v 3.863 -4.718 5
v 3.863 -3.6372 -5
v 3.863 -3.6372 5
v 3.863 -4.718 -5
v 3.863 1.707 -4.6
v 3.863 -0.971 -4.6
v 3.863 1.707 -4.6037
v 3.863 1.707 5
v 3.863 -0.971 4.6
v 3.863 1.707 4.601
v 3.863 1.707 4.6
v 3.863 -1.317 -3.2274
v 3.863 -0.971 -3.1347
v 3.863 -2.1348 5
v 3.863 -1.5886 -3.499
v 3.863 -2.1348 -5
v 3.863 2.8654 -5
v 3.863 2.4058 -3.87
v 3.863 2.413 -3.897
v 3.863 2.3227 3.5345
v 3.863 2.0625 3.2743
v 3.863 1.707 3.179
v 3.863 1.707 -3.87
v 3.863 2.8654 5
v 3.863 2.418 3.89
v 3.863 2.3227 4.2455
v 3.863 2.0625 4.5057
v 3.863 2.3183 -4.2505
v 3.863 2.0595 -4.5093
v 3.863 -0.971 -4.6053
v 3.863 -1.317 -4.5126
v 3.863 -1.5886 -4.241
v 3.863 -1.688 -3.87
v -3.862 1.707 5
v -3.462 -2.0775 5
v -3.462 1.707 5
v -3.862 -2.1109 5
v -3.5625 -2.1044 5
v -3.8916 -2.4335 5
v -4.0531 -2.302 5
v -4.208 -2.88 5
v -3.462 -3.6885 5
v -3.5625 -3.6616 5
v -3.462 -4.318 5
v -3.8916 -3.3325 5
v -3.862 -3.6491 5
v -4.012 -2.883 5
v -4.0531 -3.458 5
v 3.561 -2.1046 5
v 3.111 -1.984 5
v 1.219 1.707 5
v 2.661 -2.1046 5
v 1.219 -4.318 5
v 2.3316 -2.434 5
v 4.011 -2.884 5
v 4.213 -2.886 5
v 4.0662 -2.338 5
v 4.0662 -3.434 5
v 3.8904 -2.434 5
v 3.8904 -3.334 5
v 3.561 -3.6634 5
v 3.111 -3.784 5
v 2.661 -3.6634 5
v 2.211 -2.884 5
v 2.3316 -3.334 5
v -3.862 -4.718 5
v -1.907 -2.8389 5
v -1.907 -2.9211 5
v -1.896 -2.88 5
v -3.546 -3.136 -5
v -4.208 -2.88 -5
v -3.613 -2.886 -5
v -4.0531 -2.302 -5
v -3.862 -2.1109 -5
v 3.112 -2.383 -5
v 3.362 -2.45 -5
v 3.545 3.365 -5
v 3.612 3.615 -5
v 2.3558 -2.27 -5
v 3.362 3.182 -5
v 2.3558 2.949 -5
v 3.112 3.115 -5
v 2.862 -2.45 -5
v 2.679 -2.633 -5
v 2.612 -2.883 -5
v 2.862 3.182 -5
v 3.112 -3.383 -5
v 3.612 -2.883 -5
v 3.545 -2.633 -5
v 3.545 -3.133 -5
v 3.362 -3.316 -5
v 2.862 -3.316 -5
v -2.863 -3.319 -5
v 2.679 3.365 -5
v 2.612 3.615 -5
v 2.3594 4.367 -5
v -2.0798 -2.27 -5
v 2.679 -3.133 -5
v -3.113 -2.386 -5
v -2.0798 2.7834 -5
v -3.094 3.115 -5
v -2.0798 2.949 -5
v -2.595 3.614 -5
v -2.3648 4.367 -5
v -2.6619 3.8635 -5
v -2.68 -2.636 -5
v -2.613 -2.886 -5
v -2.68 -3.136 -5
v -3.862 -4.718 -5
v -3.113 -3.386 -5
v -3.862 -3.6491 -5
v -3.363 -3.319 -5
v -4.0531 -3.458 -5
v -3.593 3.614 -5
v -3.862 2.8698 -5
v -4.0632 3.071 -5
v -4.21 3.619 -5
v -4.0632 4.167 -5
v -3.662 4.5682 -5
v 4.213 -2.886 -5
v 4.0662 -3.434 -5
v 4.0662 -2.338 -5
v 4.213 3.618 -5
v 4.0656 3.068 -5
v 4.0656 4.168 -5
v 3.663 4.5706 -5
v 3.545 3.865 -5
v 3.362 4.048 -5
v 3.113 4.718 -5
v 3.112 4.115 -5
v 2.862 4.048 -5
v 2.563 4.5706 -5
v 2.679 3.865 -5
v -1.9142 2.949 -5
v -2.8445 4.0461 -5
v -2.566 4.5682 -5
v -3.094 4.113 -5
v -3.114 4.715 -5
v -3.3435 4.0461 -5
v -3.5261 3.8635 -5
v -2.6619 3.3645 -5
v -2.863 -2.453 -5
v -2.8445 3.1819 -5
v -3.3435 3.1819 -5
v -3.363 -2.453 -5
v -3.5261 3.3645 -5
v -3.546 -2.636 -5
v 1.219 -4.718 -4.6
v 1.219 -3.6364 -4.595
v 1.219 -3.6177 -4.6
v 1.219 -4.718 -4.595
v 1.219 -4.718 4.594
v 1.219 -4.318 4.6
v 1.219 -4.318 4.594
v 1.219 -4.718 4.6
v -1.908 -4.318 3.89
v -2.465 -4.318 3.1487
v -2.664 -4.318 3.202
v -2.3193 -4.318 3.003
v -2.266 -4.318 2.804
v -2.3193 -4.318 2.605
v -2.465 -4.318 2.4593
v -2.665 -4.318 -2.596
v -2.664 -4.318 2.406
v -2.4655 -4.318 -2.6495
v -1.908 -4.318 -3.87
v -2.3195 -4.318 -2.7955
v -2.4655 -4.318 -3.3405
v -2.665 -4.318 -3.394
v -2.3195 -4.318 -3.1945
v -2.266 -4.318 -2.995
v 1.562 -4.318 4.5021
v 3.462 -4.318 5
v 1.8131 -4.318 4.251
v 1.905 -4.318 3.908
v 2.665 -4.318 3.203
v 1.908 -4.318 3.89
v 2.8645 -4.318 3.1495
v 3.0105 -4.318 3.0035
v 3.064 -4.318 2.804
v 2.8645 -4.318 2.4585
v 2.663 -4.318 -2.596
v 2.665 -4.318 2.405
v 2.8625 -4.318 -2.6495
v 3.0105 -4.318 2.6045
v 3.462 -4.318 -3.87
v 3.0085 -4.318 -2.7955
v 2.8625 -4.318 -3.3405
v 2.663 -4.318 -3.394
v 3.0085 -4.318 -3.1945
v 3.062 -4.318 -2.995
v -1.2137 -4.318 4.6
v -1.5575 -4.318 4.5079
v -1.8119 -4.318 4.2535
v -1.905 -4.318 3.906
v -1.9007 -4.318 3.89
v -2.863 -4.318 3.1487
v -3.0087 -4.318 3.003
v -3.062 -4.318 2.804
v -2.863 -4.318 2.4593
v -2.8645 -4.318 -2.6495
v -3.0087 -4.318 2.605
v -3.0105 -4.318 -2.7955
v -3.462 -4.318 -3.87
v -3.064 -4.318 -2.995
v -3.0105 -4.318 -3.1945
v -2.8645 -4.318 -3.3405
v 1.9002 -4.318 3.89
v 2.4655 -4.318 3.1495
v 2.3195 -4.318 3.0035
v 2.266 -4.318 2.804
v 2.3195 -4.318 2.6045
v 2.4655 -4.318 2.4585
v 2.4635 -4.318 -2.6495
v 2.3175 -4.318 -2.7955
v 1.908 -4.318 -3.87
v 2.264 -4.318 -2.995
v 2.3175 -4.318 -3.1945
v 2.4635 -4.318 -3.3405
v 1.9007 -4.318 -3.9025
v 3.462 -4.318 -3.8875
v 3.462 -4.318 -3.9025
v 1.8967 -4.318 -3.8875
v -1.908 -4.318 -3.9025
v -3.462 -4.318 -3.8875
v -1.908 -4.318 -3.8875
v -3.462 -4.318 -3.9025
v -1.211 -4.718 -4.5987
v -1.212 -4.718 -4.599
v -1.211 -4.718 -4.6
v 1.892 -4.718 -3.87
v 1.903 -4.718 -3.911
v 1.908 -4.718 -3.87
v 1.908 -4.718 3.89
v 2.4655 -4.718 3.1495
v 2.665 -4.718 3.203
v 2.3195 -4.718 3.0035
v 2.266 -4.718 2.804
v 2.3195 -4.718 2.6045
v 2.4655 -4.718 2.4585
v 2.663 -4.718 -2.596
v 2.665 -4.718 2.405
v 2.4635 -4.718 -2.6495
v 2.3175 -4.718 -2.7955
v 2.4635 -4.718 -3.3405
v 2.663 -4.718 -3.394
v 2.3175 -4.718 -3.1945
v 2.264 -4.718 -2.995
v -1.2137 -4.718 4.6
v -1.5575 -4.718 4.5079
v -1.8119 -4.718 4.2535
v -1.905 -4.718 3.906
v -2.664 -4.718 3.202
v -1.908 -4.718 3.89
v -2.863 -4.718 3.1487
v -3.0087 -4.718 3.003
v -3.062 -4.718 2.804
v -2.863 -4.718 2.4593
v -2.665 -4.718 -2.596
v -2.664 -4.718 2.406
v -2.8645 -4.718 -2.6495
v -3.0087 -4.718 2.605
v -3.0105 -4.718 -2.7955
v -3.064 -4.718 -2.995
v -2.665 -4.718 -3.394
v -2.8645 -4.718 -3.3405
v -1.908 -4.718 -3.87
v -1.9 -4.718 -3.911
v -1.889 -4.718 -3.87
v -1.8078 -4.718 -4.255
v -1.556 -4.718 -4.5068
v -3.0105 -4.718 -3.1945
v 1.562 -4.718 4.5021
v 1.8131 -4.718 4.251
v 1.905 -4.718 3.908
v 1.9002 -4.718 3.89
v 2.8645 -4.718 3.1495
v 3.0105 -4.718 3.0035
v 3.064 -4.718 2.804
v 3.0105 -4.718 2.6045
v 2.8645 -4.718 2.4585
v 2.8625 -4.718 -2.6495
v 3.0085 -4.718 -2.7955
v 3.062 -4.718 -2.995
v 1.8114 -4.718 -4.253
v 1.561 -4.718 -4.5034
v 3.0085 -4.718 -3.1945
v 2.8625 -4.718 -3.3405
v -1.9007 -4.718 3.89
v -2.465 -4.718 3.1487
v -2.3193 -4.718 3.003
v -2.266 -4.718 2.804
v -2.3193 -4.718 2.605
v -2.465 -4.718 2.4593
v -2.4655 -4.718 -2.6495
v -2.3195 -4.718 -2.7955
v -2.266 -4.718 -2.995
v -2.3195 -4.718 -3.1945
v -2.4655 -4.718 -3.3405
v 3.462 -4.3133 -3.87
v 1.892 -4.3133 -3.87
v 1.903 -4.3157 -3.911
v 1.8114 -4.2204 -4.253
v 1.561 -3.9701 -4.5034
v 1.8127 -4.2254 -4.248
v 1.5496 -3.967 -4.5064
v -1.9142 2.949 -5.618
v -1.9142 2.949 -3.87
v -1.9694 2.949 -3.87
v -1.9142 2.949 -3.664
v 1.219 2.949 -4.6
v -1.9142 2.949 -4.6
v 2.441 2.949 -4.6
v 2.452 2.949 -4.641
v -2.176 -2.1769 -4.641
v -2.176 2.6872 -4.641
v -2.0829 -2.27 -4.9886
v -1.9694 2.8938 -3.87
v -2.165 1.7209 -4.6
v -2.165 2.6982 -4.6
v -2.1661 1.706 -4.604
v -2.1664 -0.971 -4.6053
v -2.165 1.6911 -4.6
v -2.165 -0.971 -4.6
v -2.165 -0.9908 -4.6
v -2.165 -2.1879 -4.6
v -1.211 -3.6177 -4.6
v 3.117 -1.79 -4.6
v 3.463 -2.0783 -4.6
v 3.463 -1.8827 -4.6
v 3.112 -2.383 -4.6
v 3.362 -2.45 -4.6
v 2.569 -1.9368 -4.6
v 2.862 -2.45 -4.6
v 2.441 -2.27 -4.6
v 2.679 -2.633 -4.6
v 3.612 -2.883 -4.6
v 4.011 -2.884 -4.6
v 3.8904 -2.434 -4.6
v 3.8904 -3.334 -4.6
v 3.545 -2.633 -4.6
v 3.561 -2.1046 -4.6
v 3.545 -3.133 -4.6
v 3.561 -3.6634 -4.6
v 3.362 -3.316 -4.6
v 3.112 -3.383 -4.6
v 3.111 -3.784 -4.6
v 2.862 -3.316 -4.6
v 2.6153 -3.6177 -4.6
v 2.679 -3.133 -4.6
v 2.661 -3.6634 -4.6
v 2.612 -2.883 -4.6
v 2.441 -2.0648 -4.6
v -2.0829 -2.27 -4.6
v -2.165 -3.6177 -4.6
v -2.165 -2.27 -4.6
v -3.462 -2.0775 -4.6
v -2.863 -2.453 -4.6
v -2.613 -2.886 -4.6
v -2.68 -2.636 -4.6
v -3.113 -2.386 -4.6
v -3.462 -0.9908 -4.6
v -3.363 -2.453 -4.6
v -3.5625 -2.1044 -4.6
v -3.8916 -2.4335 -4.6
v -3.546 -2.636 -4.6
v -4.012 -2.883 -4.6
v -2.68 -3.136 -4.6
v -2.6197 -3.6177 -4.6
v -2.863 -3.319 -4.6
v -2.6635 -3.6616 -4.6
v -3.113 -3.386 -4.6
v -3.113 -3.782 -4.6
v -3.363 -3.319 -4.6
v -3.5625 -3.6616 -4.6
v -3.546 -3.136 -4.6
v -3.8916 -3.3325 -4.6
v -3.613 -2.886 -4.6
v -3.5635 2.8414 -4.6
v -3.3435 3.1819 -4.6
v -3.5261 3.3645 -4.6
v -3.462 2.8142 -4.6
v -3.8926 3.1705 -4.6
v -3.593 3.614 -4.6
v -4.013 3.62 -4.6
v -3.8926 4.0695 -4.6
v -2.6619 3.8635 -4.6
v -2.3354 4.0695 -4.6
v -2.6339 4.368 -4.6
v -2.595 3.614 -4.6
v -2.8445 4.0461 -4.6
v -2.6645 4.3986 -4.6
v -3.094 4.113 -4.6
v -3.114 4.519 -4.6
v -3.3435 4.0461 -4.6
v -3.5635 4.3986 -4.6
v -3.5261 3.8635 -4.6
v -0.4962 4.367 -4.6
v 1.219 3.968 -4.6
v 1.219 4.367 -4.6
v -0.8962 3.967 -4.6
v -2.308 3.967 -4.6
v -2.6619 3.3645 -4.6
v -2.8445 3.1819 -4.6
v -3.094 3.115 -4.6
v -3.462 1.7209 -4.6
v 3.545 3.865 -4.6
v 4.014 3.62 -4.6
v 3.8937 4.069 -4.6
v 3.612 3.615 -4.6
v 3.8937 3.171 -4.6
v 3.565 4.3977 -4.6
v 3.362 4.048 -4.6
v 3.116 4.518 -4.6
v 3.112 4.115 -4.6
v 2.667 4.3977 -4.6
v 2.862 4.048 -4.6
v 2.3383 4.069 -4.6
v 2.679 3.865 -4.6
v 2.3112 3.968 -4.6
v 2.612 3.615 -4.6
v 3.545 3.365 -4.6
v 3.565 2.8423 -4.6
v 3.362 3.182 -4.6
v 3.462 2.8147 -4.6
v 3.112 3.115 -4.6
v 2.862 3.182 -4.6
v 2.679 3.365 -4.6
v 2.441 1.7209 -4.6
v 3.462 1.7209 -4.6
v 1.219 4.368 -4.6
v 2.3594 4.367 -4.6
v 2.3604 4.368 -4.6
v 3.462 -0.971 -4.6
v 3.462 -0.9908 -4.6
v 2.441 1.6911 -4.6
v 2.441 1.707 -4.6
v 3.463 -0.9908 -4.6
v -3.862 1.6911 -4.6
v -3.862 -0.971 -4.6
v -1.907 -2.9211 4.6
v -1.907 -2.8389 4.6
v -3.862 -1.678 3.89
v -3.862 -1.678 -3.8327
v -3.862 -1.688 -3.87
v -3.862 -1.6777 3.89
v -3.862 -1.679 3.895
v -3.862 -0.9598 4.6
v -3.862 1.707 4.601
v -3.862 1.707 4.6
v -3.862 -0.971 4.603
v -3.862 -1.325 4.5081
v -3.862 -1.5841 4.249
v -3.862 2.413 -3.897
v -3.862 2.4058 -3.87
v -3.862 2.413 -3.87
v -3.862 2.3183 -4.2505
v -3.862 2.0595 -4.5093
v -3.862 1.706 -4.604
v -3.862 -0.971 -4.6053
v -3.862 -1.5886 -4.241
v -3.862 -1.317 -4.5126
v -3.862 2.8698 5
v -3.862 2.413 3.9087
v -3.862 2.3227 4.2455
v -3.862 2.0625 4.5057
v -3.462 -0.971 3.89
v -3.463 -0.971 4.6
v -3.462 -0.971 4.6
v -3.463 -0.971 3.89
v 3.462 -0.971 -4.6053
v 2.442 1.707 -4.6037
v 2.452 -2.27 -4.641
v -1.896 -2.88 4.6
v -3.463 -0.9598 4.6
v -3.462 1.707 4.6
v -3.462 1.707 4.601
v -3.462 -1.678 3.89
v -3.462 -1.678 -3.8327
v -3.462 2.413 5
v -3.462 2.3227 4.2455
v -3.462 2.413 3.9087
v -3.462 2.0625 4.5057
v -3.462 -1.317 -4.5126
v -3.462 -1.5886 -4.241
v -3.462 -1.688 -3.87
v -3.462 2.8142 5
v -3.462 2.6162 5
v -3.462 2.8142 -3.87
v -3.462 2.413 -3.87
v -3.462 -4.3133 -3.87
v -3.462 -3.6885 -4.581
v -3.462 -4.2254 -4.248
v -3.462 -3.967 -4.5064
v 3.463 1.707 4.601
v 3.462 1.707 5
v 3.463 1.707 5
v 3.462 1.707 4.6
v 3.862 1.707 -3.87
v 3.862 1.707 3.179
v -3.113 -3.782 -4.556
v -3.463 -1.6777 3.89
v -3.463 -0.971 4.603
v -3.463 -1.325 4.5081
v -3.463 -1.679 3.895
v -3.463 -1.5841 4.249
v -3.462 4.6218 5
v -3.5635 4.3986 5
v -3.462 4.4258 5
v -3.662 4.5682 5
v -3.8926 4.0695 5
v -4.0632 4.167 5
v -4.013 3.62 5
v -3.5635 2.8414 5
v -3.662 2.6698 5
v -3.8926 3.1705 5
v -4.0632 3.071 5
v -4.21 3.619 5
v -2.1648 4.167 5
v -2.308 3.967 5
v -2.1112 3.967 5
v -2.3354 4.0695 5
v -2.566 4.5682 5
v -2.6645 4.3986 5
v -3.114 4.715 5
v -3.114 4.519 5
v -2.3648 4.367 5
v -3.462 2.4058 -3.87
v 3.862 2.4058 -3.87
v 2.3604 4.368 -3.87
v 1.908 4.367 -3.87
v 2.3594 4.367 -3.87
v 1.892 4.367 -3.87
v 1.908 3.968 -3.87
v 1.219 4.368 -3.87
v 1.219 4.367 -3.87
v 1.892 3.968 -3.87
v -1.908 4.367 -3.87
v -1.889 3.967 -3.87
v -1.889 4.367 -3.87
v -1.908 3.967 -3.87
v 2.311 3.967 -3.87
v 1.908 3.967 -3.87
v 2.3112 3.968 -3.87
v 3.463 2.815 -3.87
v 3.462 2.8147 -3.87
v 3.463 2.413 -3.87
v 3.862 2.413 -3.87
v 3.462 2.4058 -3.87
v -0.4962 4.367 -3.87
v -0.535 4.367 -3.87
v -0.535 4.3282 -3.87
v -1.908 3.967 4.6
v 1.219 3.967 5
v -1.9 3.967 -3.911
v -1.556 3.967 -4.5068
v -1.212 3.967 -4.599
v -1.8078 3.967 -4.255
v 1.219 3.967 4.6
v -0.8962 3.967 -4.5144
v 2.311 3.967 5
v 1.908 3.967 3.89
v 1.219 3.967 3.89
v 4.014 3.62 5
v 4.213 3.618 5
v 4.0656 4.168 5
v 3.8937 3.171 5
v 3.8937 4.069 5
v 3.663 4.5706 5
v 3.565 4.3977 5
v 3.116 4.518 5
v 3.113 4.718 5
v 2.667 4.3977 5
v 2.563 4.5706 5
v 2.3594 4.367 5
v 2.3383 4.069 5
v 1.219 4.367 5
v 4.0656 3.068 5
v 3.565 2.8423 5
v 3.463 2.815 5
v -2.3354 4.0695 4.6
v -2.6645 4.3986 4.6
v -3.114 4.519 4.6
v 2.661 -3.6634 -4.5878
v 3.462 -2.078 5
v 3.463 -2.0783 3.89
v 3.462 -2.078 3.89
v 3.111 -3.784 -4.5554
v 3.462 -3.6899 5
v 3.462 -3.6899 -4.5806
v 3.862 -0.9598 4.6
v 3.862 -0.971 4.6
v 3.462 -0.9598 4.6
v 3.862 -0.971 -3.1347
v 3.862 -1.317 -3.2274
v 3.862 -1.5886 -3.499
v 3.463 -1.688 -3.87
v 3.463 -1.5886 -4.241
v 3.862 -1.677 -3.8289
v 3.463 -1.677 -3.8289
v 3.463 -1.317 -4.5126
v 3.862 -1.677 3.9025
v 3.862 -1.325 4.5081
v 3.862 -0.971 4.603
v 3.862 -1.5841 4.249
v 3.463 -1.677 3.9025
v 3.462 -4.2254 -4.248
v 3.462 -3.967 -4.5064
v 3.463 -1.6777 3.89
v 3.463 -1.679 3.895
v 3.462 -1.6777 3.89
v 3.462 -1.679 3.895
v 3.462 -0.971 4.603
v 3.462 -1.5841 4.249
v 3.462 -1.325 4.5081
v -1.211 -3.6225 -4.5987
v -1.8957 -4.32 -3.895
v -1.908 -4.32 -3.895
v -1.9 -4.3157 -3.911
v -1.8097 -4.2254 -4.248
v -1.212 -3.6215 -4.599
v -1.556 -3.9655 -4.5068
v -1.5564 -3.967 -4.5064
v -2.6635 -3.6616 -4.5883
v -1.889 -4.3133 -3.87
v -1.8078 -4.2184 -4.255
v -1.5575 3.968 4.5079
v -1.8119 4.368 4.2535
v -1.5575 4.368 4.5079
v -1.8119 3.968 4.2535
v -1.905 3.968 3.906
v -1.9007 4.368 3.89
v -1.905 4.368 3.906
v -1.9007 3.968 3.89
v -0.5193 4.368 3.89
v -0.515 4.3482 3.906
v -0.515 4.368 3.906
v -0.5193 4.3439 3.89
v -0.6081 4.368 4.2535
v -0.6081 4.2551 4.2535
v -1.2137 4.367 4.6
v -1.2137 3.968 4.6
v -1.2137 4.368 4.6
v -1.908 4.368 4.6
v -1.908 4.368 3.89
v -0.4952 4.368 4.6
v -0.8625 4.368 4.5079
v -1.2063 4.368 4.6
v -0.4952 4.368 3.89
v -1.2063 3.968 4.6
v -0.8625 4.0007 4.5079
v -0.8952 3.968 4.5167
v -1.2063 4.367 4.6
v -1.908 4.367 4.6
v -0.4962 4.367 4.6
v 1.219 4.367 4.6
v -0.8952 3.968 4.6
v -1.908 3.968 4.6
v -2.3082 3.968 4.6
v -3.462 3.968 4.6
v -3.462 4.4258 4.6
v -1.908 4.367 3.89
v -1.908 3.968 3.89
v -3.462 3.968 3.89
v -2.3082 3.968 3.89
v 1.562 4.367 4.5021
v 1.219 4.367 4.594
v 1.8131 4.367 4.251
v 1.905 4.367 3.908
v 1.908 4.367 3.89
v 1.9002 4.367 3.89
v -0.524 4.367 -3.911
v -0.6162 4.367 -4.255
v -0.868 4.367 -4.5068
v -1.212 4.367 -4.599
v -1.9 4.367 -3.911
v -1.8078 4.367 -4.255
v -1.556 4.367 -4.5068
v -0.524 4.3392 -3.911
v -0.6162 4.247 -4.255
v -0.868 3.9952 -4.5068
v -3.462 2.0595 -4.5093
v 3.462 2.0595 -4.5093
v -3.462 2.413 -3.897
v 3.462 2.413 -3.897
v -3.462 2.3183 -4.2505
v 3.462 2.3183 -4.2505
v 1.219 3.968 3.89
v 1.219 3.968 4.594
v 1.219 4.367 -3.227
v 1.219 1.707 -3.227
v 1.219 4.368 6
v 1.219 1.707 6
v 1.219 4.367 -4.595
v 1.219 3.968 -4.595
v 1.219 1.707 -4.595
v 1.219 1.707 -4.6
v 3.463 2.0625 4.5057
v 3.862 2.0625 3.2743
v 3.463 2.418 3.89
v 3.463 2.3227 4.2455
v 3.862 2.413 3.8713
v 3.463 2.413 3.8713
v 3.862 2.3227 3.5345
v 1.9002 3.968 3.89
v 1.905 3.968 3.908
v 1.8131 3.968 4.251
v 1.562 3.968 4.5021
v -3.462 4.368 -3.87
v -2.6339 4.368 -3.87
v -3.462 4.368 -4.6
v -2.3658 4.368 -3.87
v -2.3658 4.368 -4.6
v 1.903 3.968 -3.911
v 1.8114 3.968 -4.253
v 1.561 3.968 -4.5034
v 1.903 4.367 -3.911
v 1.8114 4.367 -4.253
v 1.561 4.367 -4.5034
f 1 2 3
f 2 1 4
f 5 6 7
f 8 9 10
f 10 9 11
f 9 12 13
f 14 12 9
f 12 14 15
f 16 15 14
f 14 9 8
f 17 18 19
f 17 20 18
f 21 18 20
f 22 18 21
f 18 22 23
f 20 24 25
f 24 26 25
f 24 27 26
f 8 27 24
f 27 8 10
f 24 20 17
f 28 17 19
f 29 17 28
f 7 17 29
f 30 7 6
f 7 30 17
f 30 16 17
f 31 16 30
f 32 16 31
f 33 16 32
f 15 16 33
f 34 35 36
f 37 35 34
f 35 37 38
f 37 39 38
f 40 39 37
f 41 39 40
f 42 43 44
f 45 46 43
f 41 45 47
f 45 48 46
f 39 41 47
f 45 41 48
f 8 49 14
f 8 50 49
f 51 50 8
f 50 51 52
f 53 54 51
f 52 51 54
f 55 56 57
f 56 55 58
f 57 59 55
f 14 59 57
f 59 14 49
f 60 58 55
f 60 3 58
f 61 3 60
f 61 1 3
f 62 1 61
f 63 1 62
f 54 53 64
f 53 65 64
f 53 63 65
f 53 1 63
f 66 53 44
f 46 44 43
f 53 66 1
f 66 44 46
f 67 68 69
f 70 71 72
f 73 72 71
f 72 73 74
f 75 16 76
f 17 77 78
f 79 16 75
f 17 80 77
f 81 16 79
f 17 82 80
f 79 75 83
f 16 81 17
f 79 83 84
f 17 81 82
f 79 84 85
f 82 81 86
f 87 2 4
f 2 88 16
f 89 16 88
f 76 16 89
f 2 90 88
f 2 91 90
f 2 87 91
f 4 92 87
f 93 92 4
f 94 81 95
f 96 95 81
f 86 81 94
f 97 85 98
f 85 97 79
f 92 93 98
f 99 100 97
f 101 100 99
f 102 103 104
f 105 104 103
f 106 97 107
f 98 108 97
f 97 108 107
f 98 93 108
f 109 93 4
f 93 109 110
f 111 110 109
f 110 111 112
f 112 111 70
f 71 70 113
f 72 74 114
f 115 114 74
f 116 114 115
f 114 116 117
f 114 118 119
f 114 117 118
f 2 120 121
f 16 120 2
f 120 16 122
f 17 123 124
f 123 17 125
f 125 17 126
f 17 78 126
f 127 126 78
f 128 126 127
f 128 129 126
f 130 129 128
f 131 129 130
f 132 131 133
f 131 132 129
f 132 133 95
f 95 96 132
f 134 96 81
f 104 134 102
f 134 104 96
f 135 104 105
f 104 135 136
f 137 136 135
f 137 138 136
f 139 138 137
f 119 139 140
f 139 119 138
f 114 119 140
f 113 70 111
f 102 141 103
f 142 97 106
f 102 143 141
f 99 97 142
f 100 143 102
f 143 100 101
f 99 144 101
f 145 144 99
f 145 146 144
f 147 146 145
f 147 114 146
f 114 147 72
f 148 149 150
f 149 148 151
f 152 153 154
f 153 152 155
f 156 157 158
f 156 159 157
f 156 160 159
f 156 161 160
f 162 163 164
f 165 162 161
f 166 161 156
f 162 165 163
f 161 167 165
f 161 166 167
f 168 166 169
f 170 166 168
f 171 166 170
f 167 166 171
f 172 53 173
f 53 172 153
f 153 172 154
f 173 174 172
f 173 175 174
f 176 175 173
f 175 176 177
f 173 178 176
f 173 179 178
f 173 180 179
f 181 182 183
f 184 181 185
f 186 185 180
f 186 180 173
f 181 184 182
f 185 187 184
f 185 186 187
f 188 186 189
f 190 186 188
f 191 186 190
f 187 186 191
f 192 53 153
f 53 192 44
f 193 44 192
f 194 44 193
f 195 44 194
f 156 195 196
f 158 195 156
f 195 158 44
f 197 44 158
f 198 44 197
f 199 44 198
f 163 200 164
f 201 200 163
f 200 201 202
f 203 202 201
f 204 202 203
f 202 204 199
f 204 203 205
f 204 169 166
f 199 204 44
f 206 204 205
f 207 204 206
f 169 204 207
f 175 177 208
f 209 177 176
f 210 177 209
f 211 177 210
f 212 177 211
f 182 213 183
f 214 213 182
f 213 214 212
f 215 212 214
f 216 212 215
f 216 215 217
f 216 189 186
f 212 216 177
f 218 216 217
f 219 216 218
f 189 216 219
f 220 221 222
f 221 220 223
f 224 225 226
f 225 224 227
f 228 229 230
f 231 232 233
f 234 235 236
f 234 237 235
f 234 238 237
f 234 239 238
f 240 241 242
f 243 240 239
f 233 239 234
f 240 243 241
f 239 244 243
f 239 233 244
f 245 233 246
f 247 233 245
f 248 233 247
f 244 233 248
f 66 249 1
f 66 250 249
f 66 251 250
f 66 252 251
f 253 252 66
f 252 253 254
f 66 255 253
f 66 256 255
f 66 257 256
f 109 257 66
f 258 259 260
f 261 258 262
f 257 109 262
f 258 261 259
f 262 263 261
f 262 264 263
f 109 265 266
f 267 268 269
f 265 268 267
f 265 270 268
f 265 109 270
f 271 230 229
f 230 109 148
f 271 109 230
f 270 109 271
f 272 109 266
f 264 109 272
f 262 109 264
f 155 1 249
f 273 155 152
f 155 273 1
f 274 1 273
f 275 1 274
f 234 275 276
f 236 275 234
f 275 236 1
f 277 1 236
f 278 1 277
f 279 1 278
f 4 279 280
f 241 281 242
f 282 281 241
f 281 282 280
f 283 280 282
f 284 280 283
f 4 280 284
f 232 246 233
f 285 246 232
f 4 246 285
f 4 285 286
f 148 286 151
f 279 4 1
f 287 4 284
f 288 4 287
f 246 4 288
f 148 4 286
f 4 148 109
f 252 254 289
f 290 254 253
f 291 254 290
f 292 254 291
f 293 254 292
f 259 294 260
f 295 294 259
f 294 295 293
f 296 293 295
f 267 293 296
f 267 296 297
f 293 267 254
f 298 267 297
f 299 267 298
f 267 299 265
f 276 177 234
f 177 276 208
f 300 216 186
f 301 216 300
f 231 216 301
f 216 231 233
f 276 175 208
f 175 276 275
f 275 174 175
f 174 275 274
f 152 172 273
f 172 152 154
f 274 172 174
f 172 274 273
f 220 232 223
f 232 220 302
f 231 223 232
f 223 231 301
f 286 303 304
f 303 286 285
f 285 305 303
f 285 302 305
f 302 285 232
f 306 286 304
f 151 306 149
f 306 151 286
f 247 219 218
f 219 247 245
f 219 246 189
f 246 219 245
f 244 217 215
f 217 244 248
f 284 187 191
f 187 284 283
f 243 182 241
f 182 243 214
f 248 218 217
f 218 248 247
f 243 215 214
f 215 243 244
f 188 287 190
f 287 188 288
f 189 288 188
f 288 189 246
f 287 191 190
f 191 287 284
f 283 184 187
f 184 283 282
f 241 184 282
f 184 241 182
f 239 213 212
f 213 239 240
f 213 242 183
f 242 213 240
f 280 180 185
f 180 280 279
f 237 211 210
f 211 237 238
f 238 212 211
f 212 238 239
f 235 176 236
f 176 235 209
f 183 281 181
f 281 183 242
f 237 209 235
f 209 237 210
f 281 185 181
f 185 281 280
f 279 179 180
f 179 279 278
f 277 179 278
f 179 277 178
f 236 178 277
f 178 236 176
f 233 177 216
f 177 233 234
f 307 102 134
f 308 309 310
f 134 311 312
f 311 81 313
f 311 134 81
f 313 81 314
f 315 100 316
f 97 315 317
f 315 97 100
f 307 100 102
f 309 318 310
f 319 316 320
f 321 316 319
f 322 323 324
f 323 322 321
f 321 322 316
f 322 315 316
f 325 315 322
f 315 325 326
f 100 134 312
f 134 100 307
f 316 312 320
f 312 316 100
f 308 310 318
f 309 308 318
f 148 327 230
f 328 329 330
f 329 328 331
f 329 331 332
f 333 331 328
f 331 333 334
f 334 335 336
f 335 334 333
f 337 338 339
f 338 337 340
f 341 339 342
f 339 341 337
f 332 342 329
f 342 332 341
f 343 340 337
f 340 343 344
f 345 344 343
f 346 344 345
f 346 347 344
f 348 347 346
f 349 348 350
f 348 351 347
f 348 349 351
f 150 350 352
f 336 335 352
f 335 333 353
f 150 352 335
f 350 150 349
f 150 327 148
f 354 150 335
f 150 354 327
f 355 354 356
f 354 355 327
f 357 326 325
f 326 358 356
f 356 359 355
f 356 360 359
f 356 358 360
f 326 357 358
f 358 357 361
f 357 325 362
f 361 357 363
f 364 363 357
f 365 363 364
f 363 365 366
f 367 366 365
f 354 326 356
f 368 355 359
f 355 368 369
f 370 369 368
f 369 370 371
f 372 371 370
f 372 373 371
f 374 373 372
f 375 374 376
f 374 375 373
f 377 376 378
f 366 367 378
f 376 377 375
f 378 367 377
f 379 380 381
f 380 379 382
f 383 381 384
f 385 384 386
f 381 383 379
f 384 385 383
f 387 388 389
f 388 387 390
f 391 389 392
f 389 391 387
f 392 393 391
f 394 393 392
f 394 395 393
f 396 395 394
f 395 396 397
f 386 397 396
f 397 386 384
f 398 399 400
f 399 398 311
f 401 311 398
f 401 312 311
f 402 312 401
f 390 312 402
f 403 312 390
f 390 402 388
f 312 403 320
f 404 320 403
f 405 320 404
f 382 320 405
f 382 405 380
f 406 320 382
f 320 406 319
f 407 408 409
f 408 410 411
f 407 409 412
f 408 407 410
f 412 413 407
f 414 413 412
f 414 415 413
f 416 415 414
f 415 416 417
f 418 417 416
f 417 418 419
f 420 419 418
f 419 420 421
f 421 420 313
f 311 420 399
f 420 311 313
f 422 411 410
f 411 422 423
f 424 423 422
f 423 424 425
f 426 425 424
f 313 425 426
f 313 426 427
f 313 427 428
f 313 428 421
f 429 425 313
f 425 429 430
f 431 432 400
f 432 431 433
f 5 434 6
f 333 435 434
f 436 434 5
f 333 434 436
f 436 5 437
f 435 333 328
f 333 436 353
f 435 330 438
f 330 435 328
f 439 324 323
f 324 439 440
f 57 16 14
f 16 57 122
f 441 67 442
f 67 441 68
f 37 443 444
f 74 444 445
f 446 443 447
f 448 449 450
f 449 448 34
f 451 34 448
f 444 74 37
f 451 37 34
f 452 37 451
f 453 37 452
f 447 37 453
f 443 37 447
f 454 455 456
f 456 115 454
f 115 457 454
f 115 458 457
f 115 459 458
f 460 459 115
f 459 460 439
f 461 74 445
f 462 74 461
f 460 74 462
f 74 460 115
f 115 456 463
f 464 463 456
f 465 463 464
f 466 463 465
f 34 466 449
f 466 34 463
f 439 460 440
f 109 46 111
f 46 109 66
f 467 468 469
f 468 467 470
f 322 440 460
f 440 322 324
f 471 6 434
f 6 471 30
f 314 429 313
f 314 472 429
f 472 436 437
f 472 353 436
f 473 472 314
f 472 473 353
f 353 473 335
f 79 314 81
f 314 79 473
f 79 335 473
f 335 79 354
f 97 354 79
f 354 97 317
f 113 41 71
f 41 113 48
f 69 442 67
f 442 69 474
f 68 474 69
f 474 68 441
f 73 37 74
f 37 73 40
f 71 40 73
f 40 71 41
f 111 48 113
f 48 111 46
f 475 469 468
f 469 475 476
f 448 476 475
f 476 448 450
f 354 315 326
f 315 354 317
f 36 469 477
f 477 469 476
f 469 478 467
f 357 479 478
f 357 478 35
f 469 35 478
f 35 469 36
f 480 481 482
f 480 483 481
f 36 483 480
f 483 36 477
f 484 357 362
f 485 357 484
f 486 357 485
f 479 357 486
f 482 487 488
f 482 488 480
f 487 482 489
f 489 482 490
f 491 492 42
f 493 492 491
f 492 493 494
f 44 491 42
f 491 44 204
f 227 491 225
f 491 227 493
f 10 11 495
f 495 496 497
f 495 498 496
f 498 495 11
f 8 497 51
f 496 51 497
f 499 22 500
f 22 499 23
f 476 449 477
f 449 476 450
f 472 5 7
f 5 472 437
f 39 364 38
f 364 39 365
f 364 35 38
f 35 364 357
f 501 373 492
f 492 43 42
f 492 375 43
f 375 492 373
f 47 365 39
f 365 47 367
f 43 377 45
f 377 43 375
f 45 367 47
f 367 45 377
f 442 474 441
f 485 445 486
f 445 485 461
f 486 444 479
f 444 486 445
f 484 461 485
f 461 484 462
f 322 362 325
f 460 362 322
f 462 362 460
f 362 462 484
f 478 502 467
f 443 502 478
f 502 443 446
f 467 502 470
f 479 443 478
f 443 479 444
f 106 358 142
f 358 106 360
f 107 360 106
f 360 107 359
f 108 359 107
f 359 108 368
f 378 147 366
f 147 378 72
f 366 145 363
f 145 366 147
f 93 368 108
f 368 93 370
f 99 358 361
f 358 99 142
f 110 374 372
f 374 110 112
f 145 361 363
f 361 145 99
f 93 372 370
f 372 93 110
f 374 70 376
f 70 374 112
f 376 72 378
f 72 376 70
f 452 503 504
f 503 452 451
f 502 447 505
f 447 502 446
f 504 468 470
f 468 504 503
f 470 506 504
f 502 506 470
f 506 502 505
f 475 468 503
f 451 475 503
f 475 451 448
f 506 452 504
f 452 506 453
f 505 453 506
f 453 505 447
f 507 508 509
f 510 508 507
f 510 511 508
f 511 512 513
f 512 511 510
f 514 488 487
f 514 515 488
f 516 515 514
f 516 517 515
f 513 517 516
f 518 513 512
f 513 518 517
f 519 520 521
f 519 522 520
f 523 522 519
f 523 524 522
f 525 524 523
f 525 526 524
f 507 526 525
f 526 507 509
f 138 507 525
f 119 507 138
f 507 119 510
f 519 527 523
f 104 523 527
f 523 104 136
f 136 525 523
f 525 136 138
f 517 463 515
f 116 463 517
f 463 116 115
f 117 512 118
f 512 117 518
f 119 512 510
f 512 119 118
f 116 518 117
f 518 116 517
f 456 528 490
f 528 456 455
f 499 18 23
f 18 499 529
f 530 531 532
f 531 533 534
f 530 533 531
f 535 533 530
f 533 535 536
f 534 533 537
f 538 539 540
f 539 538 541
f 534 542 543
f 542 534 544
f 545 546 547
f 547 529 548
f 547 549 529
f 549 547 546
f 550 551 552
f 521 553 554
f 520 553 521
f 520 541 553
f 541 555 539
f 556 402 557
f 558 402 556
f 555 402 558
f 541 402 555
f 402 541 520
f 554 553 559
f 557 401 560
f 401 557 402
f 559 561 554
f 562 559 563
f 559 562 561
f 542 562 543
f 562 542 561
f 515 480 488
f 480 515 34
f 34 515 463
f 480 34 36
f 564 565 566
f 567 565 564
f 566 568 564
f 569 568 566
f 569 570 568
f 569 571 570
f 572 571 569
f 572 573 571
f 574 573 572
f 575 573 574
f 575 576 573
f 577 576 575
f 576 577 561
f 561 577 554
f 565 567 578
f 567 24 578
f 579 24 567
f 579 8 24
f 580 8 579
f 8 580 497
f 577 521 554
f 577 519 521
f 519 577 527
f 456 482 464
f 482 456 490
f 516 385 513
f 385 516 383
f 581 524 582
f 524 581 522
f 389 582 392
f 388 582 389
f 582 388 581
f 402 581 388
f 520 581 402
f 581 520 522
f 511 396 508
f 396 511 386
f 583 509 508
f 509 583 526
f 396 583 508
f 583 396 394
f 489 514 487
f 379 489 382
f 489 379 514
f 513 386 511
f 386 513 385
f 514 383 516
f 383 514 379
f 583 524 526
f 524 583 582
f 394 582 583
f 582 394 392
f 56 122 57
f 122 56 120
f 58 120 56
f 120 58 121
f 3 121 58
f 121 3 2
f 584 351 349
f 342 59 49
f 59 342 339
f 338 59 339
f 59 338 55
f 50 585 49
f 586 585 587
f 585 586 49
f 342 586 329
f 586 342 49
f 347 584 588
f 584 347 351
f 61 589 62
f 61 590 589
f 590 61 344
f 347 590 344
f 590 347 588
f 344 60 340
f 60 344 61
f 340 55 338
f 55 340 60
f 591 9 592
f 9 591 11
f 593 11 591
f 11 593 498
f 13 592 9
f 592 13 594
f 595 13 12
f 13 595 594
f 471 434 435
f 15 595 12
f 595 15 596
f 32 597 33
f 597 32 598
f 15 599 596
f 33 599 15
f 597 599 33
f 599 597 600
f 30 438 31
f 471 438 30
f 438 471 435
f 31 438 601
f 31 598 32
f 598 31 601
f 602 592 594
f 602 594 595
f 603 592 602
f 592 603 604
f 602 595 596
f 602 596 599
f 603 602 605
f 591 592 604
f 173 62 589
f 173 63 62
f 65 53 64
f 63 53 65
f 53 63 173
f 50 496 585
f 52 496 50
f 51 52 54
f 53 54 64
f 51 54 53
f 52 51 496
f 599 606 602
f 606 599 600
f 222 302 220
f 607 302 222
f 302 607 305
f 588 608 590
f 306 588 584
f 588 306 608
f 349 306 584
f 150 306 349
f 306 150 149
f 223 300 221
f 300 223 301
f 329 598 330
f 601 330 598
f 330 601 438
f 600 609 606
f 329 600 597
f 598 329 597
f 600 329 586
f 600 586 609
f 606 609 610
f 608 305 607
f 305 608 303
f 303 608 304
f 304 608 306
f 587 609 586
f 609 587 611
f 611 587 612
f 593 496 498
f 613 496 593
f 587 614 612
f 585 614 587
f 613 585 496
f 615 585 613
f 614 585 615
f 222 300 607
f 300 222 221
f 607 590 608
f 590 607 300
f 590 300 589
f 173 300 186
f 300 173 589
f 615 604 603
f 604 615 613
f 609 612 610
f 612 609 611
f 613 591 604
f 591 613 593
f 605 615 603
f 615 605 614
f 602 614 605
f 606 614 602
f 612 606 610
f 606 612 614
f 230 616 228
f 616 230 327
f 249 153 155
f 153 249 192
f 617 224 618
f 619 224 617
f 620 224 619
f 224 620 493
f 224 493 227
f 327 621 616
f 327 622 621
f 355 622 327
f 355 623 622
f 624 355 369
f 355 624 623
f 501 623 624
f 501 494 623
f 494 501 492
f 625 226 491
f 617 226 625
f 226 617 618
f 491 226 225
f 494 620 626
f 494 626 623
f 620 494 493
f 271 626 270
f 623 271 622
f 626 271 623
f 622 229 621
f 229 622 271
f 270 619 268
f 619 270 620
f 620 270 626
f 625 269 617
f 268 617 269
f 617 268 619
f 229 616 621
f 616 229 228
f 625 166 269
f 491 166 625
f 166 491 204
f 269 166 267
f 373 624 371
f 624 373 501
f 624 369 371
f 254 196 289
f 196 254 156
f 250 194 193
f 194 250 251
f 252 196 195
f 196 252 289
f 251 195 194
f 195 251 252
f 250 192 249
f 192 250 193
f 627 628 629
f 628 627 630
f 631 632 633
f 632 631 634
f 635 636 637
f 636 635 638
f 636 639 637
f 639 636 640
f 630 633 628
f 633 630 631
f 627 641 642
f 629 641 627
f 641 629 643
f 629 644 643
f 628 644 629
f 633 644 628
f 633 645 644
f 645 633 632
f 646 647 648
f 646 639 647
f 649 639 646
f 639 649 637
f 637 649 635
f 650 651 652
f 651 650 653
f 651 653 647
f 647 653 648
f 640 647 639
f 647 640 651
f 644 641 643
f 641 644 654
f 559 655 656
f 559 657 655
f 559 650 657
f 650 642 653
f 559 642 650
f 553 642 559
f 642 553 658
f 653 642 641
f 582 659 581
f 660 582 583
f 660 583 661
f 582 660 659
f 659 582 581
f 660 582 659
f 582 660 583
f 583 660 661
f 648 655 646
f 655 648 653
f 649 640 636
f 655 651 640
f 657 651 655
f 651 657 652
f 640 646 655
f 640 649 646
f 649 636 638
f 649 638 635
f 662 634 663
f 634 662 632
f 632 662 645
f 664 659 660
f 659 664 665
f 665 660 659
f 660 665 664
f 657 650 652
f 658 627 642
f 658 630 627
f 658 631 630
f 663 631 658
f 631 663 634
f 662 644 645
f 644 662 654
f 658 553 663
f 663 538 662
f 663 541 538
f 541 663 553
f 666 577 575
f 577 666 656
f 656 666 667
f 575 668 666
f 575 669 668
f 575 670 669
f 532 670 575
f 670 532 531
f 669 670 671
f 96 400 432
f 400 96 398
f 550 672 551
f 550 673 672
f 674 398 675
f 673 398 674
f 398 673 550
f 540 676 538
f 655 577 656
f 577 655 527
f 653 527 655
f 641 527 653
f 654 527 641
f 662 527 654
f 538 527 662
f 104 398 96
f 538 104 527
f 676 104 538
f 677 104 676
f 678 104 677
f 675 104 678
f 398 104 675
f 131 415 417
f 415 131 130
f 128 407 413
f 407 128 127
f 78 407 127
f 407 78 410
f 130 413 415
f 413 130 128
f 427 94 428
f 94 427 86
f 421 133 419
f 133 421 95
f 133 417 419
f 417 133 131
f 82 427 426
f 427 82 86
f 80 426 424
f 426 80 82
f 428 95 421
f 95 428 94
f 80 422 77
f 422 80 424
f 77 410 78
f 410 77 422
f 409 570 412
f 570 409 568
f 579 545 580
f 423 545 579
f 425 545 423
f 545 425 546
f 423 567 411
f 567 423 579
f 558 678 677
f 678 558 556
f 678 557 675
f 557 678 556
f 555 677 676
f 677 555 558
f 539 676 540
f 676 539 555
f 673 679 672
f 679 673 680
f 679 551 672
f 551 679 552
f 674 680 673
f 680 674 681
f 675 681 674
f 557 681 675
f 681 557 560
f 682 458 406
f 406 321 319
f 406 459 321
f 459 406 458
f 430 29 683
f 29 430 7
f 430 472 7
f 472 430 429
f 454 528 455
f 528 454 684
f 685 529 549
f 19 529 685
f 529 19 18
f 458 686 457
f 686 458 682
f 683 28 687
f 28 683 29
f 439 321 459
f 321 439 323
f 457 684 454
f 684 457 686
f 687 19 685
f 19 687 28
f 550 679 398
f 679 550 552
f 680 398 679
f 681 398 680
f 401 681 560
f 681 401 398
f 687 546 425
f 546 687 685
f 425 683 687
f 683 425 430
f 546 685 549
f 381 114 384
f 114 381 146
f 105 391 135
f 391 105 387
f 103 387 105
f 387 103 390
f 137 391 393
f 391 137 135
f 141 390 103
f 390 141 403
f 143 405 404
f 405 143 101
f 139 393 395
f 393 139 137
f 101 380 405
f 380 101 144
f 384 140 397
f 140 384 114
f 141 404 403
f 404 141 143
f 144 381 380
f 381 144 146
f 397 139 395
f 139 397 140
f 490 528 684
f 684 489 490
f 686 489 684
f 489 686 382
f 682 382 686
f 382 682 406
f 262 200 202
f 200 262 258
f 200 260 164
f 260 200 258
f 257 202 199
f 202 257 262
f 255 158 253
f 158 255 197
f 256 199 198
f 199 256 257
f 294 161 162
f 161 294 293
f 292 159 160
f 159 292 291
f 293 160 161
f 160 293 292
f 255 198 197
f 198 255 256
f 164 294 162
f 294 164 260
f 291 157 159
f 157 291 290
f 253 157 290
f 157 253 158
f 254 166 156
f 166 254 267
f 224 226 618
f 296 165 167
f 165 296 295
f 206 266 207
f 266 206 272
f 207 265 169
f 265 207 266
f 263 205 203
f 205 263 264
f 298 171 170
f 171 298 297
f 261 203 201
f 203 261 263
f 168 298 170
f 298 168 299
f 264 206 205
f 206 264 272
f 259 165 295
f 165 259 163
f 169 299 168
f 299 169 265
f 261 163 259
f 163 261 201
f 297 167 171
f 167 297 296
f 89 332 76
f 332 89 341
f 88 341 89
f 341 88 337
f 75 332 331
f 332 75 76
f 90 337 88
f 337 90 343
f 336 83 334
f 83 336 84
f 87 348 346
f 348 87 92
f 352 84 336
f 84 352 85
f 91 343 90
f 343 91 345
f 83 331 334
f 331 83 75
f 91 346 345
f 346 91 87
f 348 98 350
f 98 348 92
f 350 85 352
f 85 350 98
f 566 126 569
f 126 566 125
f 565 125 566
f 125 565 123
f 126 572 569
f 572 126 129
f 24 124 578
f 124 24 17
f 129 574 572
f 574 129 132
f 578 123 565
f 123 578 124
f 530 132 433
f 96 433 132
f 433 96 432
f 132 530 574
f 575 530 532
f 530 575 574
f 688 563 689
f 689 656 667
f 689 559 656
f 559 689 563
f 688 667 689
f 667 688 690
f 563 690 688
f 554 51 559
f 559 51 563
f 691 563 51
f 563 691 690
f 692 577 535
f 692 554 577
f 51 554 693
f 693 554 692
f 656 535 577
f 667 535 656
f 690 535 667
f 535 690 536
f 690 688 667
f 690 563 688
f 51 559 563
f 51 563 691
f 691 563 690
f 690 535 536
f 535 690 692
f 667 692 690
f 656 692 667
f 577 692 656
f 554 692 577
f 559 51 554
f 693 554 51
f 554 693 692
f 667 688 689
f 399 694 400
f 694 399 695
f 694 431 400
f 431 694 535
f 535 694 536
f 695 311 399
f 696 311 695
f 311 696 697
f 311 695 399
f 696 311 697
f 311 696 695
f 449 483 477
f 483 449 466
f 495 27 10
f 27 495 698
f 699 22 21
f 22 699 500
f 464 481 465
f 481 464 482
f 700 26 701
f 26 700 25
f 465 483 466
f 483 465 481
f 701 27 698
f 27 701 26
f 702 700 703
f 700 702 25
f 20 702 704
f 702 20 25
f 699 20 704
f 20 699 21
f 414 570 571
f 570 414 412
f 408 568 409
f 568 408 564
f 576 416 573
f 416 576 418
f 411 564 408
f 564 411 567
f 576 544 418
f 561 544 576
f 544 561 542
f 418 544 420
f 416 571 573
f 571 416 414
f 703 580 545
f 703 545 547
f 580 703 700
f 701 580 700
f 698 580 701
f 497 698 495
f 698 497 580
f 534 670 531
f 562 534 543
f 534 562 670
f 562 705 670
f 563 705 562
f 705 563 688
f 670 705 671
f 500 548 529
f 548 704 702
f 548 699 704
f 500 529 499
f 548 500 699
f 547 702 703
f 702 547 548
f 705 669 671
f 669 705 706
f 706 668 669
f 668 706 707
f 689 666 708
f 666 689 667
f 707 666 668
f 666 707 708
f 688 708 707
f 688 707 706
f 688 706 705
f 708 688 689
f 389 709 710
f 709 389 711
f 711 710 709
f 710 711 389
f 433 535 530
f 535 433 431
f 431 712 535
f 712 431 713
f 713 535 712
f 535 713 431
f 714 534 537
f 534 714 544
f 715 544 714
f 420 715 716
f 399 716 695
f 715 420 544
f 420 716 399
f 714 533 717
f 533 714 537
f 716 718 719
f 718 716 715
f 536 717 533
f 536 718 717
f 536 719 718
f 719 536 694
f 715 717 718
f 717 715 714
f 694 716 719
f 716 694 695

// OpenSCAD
intersection() {
union() {
intersection() {
translate([1.219, -4.718, -18.1]) cube(size = [2.644, 0.4, 23.1], center = false);
union() {
difference() {
difference() {
translate([1.219, -4.718, -5]) cube(size = [2.644, 0.4, 10], center = false);
translate([-18.1, -4.718, -3.87]) cube(size = [21.562, 3.04, 7.76], center = false);
}
union() {
rotate([180, 90, -90])
translate([-3.908, -1.219, -18.1])
cylinder(h = 36.2, r1 = 0.686, r2 = 0.686, center = false, $fn = 12);
rotate([180, 90, -90])
translate([3.911, -1.219, -4.718])
cylinder(h = 3.747, r1 = 0.684, r2 = 0.684, center = false, $fn = 12);
}
}
difference() {
translate([1.908, -4.718, -5]) cube(size = [1.555, 1.103, 8.89], center = false);
union() {
rotate([180, 90, -90])
translate([2.995, -2.663, -4.718])
cylinder(h = 1.103, r1 = 0.399, r2 = 0.399, center = false, $fn = 12);
rotate([180, 90, -90])
translate([-2.804, -2.665, -18.1])
cylinder(h = 36.2, r1 = 0.399, r2 = 0.399, center = false, $fn = 12);
}
}
}
}
intersection() {
translate([-18.1, -18.1, -18.1]) cube(size = [36.2, 36.2, 36.2], center = false);
difference() {
difference() {
rotate([180, 90, -90])
translate([4.641, -0.138, 1.707])
cylinder(h = 1.242, r1 = 2.314, r2 = 2.314, center = false, $fn = 12);
rotate([180, 0, 180])
translate([-5.191, -1.766, -18.1])
cylinder(h = 36.2, r1 = 8.653, r2 = 8.653, center = false, $fn = 12);
}
translate([-3.462, 1.707, -4.6]) cube(size = [4.681, 1.242, 0.73], center = false);
}
}
difference() {
union() {
translate([-3.052, -2.88, 4.6])
cylinder(h = 0.4, r1 = 1.156, r2 = 1.156, center = false, $fn = 12);
translate([-3.052, -2.88, -5])
cylinder(h = 9.6, r1 = 1.156, r2 = 1.156, center = false, $fn = 12);
translate([-3.862, -4.718, 4.6]) cube(size = [0.4, 6.425, 0.4], center = false);
difference() {
union() {
translate([3.117, -2.886, -5])
cylinder(h = 0.4, r1 = 1.096, r2 = 1.096, center = false, $fn = 12);
translate([-3.862, -4.318, -5]) cube(size = [1.955, 3.347, 10], center = false);
}
union() {
rotate([180, 90, -90])
translate([4.641, -0.138, -2.27])
cylinder(h = 20.37, r1 = 2.314, r2 = 2.314, center = false, $fn = 12);
translate([1.219, -4.318, -5]) cube(size = [16.881, 2.048, 0.4], center = false);
}
}
}
union() {
translate([-3.113, -2.883, -4.6])
cylinder(h = 22.7, r1 = 0.899, r2 = 0.899, center = false, $fn = 12);
translate([-3.462, -4.718, -4.6]) cube(size = [4.681, 3.747, 9.2], center = false);
translate([-3.462, -4.318, -3.87]) cube(size = [1.555, 6.025, 21.97], center = false);
rotate([180, 90, 180])
translate([3.87, -0.946, -18.1])
cylinder(h = 19.319, r1 = 0.742, r2 = 0.742, center = false, $fn = 12);
translate([-3.862, -1.678, -3.87]) cube(size = [1.955, 3.385, 7.76], center = false);
rotate([0, 0, 0])
translate([-3.113, -2.886, -18.1])
cylinder(h = 36.2, r1 = 0.5, r2 = 0.5, center = false, $fn = 12);
rotate([180, 90, 180])
translate([-3.895, -0.971, -18.1])
cylinder(h = 14.637, r1 = 0.708, r2 = 0.708, center = false, $fn = 12);
}
}
difference() {
union() {
translate([-3.862, 2.413, -3.87]) cube(size = [0.4, 1.555, 8.87], center = false);
difference() {
rotate([180, 0, 180])
translate([3.114, 3.619, -5])
cylinder(h = 8.87, r1 = 1.096, r2 = 1.096, center = false, $fn = 12);
translate([-3.462, 1.707, -3.87]) cube(size = [1.555, 2.26, 21.97], center = false);
}
}
union() {
translate([-3.462, 1.707, 5]) cube(size = [6.925, 16.393, 13.1], center = false);
translate([-3.114, 3.62, -18.1])
cylinder(h = 23.1, r1 = 0.899, r2 = 0.899, center = false, $fn = 12);
translate([3.113, 3.618, -18.1])
cylinder(h = 23.1, r1 = 1.1, r2 = 1.1, center = false, $fn = 12);
}
}
difference() {
difference() {
union() {
translate([1.908, -4.318, -5]) cube(size = [1.955, 6.025, 9.6], center = false);
translate([3.117, -2.886, -4.6])
cylinder(h = 9.6, r1 = 1.096, r2 = 1.096, center = false, $fn = 12);
difference() {
translate([1.219, -4.318, -4.6]) cube(size = [2.644, 6.025, 9.6], center = false);
rotate([180, 90, -90])
translate([3.911, -1.219, -4.318])
cylinder(h = 6.025, r1 = 0.684, r2 = 0.684, center = false, $fn = 12);
}
}
union() {
rotate([180, 0, 180])
translate([-3.111, -2.884, -18.1])
cylinder(h = 36.2, r1 = 0.9, r2 = 0.9, center = false, $fn = 12);
translate([1.219, -0.971, -4.6]) cube(size = [2.644, 2.678, 9.2], center = false);
rotate([180, 90, 180])
translate([3.87, -0.946, 3.462])
cylinder(h = 14.637, r1 = 0.742, r2 = 0.742, center = false, $fn = 12);
rotate([180, 90, -90])
translate([4.641, -0.138, -3.614])
cylinder(h = 5.322, r1 = 2.314, r2 = 2.314, center = false, $fn = 12);
}
}
intersection() {
union() {
difference() {
translate([-18.1, -4.318, -3.87]) cube(size = [21.962, 6.025, 8.87], center = false);
translate([1.219, -3.614, -3.87]) cube(size = [2.644, 1.937, 8.47], center = false);
}
rotate([-180, 90, 180])
translate([3.895, -3.614, 1.219])
cylinder(h = 2.244, r1 = 0.706, r2 = 0.706, center = false, $fn = 12);
translate([1.219, -3.614, -4.6]) cube(size = [2.244, 21.714, 9.2], center = false);
}
union() {
translate([-18.1, -3.614, -18.1]) cube(size = [36.2, 21.714, 21.99], center = false);
translate([-18.1, -4.718, -18.1]) cube(size = [21.562, 22.817, 23.1], center = false);
rotate([180, 90, 180])
translate([-3.895, -0.971, -18.1])
cylinder(h = 36.2, r1 = 0.708, r2 = 0.708, center = false, $fn = 12);
}
}
}
intersection() {
difference() {
difference() {
translate([-3.862, -18.1, -5]) cube(size = [2.651, 17.129, 9.6], center = false);
rotate([-180, 90, 180])
translate([3.895, -3.614, -3.462])
cylinder(h = 21.562, r1 = 0.706, r2 = 0.706, center = false, $fn = 12);
}
union() {
rotate([180, 90, -90])
translate([3.911, 1.212, -18.1])
cylinder(h = 14.486, r1 = 0.688, r2 = 0.688, center = false, $fn = 12);
translate([-3.113, -2.883, -4.6])
cylinder(h = 0.73, r1 = 0.899, r2 = 0.899, center = false, $fn = 12);
}
}
union() {
difference() {
translate([-3.862, -4.718, 3.89]) cube(size = [2.651, 0.4, 1.11], center = false);
rotate([180, 90, -90])
translate([-3.906, 1.21, -18.1])
cylinder(h = 36.2, r1 = 0.695, r2 = 0.695, center = false, $fn = 12);
}
difference() {
translate([-3.862, -4.718, -5]) cube(size = [21.962, 1.103, 8.89], center = false);
translate([-3.862, -4.718, -3.87]) cube(size = [2.651, 3.04, 7.76], center = false);
}
}
}
intersection() {
difference() {
translate([-3.462, 3.968, 3.89]) cube(size = [4.681, 14.132, 0.71], center = false);
union() {
rotate([180, 90, -90])
translate([-3.906, 1.21, -18.1])
cylinder(h = 22.468, r1 = 0.695, r2 = 0.695, center = false, $fn = 12);
rotate([180, 0, 180])
translate([-5.191, -1.766, -4.6])
cylinder(h = 0.71, r1 = 8.653, r2 = 8.653, center = false, $fn = 12);
}
}
union() {
translate([-1.908, 3.968, -3.87]) cube(size = [3.127, 0.4, 8.47], center = false);
rotate([180, 0, 180])
translate([3.114, 3.619, -5])
cylinder(h = 0.4, r1 = 1.096, r2 = 1.096, center = false, $fn = 12);
translate([-3.462, 2.413, 3.89]) cube(size = [7.325, 1.555, 0.71], center = false);
}
}
difference() {
difference() {
difference() {
union() {
translate([-3.862, -0.971, -5]) cube(size = [7.725, 5.338, 1.13], center = false);
rotate([180, 0, 180])
translate([3.114, 3.619, 3.87])
cylinder(h = 1.13, r1 = 1.096, r2 = 1.096, center = false, $fn = 12);
}
rotate([180, 0, 180])
translate([-3.112, 3.615, 4.6])
cylinder(h = 13.5, r1 = 0.5, r2 = 0.5, center = false, $fn = 12);
}
union() {
translate([3.116, 3.62, -4.6])
cylinder(h = 22.7, r1 = 0.898, r2 = 0.898, center = false, $fn = 12);
rotate([180, 90, -90])
translate([3.911, 1.212, -0.971])
cylinder(h = 19.07, r1 = 0.688, r2 = 0.688, center = false, $fn = 12);
rotate([180, 90, 180])
translate([3.897, 1.706, -18.1])
cylinder(h = 36.2, r1 = 0.707, r2 = 0.707, center = false, $fn = 12);
}
}
union() {
rotate([0, 0, 0])
translate([-3.094, 3.614, -18.1])
cylinder(h = 13.5, r1 = 0.499, r2 = 0.499, center = false, $fn = 12);
translate([-3.862, -0.971, -4.6]) cube(size = [7.325, 2.678, 22.7], center = false);
rotate([180, 90, -90])
translate([4.641, -0.138, -18.1])
cylinder(h = 21.049, r1 = 2.314, r2 = 2.314, center = false, $fn = 12);
difference() {
union() {
translate([-3.114, 3.62, -4.6])
cylinder(h = 22.7, r1 = 0.899, r2 = 0.899, center = false, $fn = 12);
rotate([180, 0, 180])
translate([-5.191, -1.766, -18.1])
cylinder(h = 22.7, r1 = 8.653, r2 = 8.653, center = false, $fn = 12);
}
translate([3.462, 1.707, -4.6]) cube(size = [14.637, 16.393, 22.7], center = false);
}
translate([-3.462, 1.707, -4.6]) cube(size = [4.681, 2.26, 0.73], center = false);
}
}
difference() {
difference() {
translate([-3.862, -4.718, -5]) cube(size = [5.081, 0.4, 10], center = false);
rotate([180, 90, -90])
translate([-2.804, 2.664, -18.1])
cylinder(h = 36.2, r1 = 0.398, r2 = 0.398, center = false, $fn = 12);
}
union() {
translate([-1.908, -4.718, -4.6]) cube(size = [3.127, 0.4, 9.2], center = false);
rotate([180, 90, -90])
translate([2.995, 2.665, -4.718])
cylinder(h = 1.103, r1 = 0.399, r2 = 0.399, center = false, $fn = 12);
}
}
intersection() {
difference() {
translate([-3.462, -4.718, -5]) cube(size = [21.562, 2.448, 0.4], center = false);
rotate([0, 0, 0])
translate([3.112, -2.883, -5])
cylinder(h = 23.1, r1 = 0.5, r2 = 0.5, center = false, $fn = 12);
}
union() {
translate([3.117, -2.886, -5])
cylinder(h = 0.4, r1 = 1.096, r2 = 1.096, center = false, $fn = 12);
rotate([180, 90, -90])
translate([4.641, -0.138, -4.718])
cylinder(h = 2.448, r1 = 2.314, r2 = 2.314, center = false, $fn = 12);
}
}
difference() {
difference() {
difference() {
union() {
translate([-3.862, 1.707, -3.87]) cube(size = [7.725, 2.66, 8.87], center = false);
translate([3.113, 3.618, -3.87])
cylinder(h = 8.87, r1 = 1.1, r2 = 1.1, center = false, $fn = 12);
}
union() {
translate([-3.862, 1.707, -3.87]) cube(size = [0.4, 2.66, 7.76], center = false);
translate([-1.908, 1.707, -3.87]) cube(size = [3.127, 2.66, 8.47], center = false);
}
}
union() {
rotate([180, 90, 180])
translate([-3.89, 1.707, -3.862])
cylinder(h = 21.962, r1 = 0.711, r2 = 0.711, center = false, $fn = 12);
translate([3.116, 3.62, -18.1])
cylinder(h = 36.2, r1 = 0.898, r2 = 0.898, center = false, $fn = 12);
translate([-3.462, 1.707, -3.87]) cube(size = [6.925, 2.26, 21.97], center = false);
rotate([180, 0, 180])
translate([3.114, 3.619, -5])
cylinder(h = 8.87, r1 = 1.096, r2 = 1.096, center = false, $fn = 12);
}
}
union() {
rotate([180, 90, -90])
translate([-3.908, -1.219, 3.968])
cylinder(h = 14.132, r1 = 0.686, r2 = 0.686, center = false, $fn = 12);
difference() {
union() {
translate([1.219, 2.413, -18.1]) cube(size = [0.689, 1.955, 21.99], center = false);
translate([3.462, 1.707, -3.87]) cube(size = [0.4, 16.393, 8.47], center = false);
}
union() {
translate([3.462, 2.413, -3.87]) cube(size = [14.637, 15.687, 7.76], center = false);
rotate([180, 0, 180])
translate([-5.191, -1.766, -4.6])
cylinder(h = 0.71, r1 = 8.653, r2 = 8.653, center = false, $fn = 12);
}
}
}
}
intersection() {
union() {
difference() {
translate([3.113, 3.618, -5])
cylinder(h = 1.13, r1 = 1.1, r2 = 1.1, center = false, $fn = 12);
translate([1.219, 1.707, -18.1]) cube(size = [2.644, 2.66, 14.23], center = false);
}
translate([-3.462, -18.1, -4.6]) cube(size = [4.681, 22.468, 22.7], center = false);
translate([1.219, 3.968, -4.6]) cube(size = [2.644, 0.4, 0.73], center = false);
}
difference() {
union() {
translate([1.219, 1.707, -18.1]) cube(size = [16.881, 16.393, 36.2], center = false);
translate([-3.462, 4.368, -18.1]) cube(size = [4.681, 13.732, 14.23], center = false);
}
union() {
translate([3.116, 3.62, -4.6])
cylinder(h = 22.7, r1 = 0.898, r2 = 0.898, center = false, $fn = 12);
rotate([180, 90, -90])
translate([3.911, -1.219, 1.707])
cylinder(h = 2.66, r1 = 0.684, r2 = 0.684, center = false, $fn = 12);
}
}
}
}
translate([-5.055, -5.661, -6]) cube(size = [10.11, 11.322, 12], center = false);
}
